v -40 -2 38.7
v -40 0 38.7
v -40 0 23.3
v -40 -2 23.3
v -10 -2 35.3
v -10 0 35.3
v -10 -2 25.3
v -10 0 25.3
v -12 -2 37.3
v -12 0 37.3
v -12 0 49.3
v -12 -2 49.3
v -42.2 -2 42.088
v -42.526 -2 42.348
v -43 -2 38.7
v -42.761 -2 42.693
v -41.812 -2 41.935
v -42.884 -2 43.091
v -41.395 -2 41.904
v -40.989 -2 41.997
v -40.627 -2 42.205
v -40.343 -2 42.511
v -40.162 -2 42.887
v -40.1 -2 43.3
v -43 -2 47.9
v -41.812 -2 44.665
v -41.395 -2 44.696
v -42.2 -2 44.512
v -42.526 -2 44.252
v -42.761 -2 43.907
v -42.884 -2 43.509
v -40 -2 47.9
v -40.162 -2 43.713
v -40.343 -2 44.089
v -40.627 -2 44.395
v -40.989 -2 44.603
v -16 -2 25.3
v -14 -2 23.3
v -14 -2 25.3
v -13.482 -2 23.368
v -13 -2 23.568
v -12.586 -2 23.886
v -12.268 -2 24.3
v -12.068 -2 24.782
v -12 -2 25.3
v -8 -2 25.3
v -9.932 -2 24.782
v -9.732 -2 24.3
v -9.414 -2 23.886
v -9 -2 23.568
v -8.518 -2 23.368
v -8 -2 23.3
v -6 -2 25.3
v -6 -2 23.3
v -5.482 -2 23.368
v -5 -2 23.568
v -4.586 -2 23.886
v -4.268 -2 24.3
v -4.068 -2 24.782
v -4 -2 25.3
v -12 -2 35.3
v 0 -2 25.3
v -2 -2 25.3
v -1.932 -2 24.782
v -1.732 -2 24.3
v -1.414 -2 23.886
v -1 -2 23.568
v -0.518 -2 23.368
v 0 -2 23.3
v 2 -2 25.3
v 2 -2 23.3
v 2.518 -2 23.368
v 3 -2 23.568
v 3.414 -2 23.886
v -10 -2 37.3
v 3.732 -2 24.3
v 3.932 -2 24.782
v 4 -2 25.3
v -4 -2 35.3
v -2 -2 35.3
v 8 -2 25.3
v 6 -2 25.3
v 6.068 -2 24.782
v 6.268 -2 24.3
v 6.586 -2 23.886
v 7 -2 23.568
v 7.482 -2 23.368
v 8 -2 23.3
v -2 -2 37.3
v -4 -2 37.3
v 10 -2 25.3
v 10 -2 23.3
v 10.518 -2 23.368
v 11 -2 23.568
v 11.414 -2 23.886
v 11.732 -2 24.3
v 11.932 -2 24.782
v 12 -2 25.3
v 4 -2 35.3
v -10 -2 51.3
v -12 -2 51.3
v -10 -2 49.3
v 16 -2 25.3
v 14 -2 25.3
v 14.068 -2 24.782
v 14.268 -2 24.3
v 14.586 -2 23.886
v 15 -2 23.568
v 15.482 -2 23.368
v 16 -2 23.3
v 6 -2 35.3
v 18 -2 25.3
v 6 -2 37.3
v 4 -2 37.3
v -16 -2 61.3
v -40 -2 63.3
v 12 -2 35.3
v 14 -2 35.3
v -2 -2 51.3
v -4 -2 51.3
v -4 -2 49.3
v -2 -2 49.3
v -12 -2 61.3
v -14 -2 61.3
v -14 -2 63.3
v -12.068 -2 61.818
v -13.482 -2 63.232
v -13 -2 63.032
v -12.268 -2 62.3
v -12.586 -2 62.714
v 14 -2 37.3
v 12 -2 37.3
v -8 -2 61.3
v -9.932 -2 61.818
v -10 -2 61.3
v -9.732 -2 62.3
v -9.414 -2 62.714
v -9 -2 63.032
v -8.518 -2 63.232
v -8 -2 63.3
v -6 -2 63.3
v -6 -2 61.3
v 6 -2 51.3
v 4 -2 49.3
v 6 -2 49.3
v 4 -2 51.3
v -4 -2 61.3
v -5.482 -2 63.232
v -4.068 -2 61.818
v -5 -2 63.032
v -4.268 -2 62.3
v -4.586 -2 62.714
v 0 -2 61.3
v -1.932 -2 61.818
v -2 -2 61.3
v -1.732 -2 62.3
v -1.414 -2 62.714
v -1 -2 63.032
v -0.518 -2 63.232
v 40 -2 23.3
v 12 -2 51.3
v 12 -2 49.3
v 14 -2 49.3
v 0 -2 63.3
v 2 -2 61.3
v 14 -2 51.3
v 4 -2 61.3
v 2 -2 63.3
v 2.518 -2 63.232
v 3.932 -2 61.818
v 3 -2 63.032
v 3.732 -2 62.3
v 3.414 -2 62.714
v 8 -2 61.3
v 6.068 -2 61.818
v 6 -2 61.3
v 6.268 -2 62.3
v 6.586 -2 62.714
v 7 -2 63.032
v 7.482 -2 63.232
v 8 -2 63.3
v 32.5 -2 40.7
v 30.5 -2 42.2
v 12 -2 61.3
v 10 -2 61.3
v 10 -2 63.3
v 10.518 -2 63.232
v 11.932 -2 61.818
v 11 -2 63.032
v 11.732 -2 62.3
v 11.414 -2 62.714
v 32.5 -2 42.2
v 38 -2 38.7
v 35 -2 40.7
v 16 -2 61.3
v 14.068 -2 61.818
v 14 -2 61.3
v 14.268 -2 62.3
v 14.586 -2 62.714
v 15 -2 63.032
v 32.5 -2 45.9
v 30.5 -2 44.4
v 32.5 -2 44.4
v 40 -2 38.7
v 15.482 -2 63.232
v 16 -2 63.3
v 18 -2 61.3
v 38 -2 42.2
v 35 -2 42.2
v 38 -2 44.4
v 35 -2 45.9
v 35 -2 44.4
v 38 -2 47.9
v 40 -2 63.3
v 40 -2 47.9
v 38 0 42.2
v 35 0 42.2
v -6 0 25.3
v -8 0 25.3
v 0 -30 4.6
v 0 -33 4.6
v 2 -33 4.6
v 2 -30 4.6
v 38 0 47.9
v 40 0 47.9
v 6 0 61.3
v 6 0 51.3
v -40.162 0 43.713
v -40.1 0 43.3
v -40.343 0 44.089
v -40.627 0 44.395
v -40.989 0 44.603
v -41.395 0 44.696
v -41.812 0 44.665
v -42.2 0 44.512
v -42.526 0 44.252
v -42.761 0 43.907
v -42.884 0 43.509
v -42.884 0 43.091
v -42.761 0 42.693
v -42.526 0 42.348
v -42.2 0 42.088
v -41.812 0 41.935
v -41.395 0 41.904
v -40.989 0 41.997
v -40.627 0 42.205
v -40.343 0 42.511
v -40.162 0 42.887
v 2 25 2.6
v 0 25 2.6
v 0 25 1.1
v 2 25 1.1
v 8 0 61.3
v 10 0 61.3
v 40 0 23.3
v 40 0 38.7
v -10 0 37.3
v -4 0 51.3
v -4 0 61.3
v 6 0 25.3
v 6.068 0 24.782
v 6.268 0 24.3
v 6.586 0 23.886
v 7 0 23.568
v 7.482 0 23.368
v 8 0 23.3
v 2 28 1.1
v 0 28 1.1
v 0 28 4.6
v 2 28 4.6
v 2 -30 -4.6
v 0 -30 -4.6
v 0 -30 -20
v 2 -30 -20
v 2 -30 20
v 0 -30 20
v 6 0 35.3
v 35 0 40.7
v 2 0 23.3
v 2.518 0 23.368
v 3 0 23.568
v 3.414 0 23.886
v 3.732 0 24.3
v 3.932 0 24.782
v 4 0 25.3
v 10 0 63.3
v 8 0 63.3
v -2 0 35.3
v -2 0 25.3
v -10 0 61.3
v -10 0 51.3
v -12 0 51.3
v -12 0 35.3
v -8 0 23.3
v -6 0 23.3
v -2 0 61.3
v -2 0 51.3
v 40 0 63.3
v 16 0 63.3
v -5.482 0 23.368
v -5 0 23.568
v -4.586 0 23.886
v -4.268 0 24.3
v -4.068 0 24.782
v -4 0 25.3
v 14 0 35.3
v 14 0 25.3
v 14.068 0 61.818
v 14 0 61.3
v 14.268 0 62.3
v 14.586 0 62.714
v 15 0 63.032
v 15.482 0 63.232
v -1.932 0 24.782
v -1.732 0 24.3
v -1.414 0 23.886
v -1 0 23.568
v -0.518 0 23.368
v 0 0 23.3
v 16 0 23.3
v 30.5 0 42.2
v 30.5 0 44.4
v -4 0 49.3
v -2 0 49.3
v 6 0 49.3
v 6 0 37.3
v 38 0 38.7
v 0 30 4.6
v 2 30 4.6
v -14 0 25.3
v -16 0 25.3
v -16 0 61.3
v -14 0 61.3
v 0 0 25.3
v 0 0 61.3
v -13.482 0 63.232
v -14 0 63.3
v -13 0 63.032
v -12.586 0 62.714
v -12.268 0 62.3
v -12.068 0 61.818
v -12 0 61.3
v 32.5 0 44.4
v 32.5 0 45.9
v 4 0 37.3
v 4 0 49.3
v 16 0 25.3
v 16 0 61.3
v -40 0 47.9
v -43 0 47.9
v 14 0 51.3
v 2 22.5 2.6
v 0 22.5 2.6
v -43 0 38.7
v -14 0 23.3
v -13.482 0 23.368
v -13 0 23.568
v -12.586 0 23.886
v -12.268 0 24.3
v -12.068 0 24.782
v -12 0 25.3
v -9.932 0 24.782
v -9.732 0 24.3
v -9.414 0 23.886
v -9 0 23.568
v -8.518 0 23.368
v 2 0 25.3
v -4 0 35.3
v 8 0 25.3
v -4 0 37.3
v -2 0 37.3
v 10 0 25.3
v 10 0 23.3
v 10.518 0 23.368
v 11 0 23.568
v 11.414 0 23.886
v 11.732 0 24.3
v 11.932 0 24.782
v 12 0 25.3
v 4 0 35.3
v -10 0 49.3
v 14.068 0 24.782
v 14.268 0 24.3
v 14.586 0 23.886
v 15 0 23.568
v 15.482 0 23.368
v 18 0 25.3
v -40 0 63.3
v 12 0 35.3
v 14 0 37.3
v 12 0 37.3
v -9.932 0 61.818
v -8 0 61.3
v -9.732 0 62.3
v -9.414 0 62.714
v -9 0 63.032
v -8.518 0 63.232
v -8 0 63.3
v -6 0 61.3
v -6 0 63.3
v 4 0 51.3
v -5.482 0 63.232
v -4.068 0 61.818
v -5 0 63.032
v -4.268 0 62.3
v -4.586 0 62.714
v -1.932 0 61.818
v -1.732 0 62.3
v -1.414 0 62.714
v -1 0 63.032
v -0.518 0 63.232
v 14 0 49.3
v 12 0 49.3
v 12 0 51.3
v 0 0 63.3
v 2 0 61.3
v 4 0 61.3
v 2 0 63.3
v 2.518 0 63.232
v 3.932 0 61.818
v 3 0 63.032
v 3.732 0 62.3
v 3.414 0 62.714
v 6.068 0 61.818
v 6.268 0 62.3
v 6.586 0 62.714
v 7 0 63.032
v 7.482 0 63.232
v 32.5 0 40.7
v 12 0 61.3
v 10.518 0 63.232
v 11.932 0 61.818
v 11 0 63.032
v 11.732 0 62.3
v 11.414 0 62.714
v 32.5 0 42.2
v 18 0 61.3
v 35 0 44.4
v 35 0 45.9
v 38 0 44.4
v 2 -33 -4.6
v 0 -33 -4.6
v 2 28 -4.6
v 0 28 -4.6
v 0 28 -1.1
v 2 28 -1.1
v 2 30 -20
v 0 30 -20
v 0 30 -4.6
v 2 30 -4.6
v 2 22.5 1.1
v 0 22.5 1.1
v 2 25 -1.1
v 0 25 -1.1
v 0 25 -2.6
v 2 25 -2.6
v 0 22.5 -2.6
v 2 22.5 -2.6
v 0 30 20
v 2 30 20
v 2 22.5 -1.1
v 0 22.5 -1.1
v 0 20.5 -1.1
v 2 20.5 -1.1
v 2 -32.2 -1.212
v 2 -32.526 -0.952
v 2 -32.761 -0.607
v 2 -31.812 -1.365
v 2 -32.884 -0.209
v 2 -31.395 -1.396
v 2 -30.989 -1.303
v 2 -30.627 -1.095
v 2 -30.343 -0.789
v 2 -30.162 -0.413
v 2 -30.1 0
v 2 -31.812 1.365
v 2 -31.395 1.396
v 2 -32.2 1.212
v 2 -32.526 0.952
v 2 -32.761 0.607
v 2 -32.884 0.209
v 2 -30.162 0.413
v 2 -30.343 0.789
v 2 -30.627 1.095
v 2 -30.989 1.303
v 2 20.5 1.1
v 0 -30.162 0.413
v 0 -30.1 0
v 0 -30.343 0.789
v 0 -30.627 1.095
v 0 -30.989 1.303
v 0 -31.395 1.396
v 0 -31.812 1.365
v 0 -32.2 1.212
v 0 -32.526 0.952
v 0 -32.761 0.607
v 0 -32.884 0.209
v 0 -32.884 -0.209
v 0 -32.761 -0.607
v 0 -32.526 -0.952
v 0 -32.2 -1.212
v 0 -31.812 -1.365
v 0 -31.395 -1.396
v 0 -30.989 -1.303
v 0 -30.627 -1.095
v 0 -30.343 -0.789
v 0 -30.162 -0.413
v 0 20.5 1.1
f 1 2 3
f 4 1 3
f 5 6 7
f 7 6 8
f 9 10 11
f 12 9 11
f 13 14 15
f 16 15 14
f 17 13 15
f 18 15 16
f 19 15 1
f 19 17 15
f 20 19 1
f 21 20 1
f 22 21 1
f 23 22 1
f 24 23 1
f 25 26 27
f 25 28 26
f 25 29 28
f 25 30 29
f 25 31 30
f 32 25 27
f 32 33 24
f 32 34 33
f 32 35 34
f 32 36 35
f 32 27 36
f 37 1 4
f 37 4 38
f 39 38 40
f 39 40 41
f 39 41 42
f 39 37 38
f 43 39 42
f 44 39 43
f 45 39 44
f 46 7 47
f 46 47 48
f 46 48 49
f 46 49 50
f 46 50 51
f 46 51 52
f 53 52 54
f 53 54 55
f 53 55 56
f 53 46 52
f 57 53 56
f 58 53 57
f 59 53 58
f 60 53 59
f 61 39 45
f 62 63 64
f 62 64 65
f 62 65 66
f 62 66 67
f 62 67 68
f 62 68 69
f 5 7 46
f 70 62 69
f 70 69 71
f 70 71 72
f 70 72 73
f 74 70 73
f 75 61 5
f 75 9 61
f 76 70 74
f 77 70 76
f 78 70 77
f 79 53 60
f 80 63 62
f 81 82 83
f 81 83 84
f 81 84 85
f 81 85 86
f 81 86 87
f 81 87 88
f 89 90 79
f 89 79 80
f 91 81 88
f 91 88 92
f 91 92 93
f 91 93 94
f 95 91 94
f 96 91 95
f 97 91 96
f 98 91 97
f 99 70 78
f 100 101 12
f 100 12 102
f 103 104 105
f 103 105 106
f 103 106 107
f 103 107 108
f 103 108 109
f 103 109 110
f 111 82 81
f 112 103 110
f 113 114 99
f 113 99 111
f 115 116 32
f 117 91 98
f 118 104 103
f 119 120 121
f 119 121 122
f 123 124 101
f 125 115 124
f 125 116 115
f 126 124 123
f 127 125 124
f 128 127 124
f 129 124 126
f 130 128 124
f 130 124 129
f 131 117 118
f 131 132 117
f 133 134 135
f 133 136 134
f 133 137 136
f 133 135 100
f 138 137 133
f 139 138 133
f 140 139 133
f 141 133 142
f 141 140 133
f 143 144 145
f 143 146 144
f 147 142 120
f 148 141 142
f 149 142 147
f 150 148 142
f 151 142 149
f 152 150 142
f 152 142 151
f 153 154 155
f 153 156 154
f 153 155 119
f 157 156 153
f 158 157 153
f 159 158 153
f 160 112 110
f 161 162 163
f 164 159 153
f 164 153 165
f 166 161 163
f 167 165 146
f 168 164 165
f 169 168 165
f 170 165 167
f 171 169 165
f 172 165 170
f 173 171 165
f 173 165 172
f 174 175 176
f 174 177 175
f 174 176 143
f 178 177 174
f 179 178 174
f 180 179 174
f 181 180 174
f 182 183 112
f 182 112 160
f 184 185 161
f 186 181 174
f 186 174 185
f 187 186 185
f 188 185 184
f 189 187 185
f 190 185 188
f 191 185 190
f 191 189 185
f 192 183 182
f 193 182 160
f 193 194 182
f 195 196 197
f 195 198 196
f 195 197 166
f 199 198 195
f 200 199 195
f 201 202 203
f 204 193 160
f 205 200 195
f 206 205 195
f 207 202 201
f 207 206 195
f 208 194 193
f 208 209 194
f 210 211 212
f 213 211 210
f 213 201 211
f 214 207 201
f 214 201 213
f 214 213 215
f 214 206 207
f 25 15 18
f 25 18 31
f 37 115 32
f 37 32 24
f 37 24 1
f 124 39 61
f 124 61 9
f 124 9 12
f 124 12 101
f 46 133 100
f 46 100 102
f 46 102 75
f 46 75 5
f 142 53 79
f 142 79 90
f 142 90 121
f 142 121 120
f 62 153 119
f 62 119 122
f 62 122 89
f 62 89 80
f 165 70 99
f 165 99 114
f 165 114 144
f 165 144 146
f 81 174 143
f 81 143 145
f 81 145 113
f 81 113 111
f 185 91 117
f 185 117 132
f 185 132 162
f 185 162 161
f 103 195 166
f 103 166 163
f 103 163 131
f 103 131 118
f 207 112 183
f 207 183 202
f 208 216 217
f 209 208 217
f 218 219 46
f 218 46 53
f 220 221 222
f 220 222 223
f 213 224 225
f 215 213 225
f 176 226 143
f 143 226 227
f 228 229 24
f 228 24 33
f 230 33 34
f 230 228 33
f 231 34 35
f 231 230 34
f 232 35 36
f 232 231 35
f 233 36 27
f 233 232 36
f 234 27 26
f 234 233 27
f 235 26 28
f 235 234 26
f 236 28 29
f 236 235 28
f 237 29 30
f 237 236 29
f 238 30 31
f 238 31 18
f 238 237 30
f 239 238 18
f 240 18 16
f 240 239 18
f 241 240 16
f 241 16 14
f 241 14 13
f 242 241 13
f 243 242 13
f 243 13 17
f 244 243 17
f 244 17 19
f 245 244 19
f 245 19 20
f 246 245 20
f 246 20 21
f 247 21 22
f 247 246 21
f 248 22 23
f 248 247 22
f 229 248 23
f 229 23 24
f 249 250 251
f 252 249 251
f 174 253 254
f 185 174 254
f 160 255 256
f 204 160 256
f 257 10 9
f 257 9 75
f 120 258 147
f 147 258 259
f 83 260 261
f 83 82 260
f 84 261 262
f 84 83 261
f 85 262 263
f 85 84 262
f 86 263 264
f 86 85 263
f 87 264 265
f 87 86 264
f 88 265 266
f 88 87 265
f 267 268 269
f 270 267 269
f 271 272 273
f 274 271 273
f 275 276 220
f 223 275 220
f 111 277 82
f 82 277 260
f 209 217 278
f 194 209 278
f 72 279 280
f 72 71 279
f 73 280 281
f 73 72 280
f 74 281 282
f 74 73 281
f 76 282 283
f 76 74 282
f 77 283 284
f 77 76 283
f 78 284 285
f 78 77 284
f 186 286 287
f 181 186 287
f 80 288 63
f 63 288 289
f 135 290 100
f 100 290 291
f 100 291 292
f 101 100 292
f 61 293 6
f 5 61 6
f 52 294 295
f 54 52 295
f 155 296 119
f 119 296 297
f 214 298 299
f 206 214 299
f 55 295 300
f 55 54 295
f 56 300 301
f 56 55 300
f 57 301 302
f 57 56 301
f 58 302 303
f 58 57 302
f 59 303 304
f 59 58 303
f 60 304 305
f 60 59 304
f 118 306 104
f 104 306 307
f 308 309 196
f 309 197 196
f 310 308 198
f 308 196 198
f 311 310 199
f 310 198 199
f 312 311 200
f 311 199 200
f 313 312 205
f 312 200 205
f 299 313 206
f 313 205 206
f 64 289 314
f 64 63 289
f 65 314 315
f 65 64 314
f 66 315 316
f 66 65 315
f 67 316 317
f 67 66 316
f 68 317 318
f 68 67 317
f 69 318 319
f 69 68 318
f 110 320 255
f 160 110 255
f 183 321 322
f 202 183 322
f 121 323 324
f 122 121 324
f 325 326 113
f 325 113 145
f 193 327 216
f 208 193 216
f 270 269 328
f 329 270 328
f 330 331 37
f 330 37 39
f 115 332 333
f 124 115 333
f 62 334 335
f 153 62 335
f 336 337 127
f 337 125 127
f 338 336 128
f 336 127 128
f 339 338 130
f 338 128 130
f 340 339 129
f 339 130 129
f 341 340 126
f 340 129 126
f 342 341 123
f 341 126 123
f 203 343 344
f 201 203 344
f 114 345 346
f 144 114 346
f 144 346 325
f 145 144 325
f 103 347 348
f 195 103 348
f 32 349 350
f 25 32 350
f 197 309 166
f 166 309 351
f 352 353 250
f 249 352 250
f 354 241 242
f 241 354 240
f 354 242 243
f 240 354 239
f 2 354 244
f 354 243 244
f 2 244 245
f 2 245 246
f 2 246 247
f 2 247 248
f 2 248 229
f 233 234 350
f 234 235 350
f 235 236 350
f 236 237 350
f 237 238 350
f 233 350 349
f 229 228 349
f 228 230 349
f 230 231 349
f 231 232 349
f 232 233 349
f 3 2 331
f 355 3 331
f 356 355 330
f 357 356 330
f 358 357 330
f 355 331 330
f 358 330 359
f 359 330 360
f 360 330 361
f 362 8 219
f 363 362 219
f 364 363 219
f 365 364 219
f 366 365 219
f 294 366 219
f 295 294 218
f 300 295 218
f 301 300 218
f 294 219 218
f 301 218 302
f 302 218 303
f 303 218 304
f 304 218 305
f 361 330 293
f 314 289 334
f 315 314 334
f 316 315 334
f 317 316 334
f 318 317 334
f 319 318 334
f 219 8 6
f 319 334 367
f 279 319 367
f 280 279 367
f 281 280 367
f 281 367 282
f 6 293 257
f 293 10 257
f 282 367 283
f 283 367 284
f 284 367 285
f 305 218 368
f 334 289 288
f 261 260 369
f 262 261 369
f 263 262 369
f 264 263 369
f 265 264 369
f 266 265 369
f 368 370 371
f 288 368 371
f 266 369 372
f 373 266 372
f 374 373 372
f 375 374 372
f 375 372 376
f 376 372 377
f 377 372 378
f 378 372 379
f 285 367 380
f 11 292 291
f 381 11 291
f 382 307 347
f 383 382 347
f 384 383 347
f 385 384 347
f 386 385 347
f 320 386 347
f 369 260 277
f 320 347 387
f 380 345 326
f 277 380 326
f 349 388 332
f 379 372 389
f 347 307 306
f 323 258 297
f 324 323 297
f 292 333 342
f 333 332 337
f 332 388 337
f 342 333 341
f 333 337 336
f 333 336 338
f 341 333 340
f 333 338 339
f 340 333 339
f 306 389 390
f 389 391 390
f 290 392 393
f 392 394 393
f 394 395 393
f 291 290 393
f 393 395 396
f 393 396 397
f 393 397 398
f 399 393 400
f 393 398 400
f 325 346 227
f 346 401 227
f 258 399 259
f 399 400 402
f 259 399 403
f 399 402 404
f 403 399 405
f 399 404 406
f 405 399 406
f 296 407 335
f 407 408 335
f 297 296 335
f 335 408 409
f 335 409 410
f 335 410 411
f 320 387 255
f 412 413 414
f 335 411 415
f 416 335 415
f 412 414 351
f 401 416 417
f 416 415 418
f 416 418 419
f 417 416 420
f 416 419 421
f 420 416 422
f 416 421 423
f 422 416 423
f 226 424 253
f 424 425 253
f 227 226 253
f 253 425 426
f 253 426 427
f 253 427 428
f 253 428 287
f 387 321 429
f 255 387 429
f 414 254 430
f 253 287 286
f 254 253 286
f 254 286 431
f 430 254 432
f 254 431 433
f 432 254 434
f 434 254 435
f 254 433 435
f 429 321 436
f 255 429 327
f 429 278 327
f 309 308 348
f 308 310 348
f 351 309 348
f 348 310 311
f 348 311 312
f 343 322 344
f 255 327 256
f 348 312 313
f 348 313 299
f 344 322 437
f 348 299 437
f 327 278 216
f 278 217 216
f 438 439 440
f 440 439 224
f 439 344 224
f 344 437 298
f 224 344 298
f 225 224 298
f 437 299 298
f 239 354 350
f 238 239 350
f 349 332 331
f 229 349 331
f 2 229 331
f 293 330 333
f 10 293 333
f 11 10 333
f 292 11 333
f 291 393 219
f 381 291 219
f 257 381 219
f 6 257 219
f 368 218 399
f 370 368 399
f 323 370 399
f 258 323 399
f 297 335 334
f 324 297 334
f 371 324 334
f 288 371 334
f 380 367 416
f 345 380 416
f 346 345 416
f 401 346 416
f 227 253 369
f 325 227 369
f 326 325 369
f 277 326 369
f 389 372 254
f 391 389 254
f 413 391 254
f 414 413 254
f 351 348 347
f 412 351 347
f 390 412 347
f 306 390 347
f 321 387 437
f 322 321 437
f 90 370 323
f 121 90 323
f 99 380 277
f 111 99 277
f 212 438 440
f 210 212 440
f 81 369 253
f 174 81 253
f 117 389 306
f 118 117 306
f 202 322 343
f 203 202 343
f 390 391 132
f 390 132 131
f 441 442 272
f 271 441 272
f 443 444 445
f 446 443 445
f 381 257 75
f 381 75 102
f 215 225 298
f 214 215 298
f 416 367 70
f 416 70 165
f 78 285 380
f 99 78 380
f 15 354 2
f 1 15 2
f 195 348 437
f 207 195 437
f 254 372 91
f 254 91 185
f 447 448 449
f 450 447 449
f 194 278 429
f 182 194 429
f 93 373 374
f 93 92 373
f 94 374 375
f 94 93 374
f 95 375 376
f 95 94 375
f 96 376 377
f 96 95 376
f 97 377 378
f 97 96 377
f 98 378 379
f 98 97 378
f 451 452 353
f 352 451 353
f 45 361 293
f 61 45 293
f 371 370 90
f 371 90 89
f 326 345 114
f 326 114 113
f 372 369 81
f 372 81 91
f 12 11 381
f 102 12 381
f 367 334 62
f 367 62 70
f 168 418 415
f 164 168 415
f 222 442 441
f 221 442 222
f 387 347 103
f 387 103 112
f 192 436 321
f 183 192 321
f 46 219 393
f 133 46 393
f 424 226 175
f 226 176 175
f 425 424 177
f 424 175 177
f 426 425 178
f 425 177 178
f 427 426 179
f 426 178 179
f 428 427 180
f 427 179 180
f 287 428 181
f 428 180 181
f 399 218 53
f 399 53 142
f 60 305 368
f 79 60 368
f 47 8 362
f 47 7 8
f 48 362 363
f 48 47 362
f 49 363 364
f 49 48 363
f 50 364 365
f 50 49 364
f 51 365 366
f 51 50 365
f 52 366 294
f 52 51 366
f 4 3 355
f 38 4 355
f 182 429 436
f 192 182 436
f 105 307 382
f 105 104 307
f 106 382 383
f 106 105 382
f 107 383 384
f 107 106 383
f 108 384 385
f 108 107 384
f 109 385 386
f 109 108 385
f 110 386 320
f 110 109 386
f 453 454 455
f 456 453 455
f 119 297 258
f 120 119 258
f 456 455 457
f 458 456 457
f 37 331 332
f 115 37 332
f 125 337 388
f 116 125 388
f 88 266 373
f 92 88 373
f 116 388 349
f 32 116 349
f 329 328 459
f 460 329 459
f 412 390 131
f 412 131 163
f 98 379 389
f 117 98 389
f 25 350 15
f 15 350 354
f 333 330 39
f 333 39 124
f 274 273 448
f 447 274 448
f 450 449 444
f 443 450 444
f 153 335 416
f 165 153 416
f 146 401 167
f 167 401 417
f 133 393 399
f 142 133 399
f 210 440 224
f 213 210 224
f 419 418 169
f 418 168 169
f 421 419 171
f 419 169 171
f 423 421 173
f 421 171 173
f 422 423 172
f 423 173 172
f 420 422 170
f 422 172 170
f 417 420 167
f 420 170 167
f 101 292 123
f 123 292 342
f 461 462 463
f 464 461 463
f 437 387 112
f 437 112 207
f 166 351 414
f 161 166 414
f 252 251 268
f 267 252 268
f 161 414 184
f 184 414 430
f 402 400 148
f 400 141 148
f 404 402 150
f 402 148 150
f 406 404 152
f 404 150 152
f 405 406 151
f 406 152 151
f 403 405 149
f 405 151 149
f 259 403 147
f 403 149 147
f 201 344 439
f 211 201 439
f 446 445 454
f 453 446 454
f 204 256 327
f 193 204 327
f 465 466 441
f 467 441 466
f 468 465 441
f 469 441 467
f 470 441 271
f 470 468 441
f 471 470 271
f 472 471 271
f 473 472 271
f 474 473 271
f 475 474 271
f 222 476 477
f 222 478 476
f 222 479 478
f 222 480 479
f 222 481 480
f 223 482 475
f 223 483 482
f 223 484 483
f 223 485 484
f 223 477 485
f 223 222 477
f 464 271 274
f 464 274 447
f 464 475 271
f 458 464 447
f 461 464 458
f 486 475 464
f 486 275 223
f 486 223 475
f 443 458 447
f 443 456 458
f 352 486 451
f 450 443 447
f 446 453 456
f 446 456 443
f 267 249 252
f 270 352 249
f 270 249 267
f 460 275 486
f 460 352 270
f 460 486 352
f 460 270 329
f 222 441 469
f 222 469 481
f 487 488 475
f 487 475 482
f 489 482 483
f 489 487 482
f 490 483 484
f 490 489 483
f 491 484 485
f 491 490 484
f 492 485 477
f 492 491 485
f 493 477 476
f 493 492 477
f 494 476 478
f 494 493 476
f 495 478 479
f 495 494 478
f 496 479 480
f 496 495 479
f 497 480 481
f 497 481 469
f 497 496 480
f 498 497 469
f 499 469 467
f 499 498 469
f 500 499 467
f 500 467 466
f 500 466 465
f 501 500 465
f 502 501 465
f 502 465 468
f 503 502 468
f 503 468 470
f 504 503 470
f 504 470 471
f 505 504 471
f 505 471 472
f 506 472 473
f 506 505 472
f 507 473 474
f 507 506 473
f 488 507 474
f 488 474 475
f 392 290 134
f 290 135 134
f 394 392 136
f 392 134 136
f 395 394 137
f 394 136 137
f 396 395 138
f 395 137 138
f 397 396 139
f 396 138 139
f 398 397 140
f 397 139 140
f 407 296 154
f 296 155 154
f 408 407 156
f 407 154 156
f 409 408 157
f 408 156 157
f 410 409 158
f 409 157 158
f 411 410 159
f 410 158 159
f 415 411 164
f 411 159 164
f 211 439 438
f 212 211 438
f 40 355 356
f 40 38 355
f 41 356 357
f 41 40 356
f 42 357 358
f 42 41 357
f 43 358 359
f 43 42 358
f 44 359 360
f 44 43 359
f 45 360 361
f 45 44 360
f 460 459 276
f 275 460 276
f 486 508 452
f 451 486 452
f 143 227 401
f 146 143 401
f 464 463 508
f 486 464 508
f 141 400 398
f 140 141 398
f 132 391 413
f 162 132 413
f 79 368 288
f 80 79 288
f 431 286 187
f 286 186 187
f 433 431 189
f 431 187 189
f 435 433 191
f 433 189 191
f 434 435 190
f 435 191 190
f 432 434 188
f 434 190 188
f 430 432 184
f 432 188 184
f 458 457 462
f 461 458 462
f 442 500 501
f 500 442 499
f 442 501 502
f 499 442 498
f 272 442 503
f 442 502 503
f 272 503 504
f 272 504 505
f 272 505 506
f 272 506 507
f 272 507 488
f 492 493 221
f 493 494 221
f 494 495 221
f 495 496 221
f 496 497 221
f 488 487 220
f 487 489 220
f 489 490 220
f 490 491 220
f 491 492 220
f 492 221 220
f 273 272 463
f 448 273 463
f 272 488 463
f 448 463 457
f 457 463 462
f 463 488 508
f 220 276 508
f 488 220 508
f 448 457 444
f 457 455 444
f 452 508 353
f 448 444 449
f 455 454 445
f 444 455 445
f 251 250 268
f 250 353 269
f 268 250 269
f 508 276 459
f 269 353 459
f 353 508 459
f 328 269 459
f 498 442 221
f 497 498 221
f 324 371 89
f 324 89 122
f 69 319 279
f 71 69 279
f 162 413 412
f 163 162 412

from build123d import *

# Parameters (mm, degrees)
F0_W     = 2
F0_H     = 36
F0_H_2   = 12
F1_DEPTH = 2
F2_W     = 3
F2_H     = 9.2
F2_R     = 1.4
F3_DEPTH = 2
F0_R     = 1.4
F4_DEPTH = 2
F5_R     = 2


with BuildPart() as f1:
    # F0 (on Front) → F1 (new body)
    with BuildSketch(Plane.XZ):
        Polygon((-11.999999, 63.3), (-39.999999, 63.3), (-39.999999, 47.9), (-39.999999, 44.8), (-39.999999, 41.8), (-39.999999, 38.7), (-39.999999, 23.3), (-11.999999, 23.3), (-11.999999, 35.3), (-9.999999, 35.3), (-9.999999, 23.3), (-3.999999, 23.3), (-3.999999, 35.3), (-1.999999, 35.3), (-1.999999, 23.3), (4.000001, 23.3), (4.000001, 35.3), (6.000001, 35.3), (6.000001, 23.3), (12.000001, 23.3), (12.000001, 35.3), (14.000001, 35.3), (14.000001, 23.3), (40.000001, 23.3), (40.000001, 38.7), (38.000001, 38.7), (38.000001, 42.2), (35.000001, 42.2), (35.000001, 40.7), (32.500001, 40.7), (32.500001, 42.2), (30.500001, 42.2), (30.500001, 43.3), (30.500001, 44.4), (32.500001, 44.4), (32.500001, 45.9), (35.000001, 45.9), (35.000001, 44.4), (38.000001, 44.4), (38.000001, 47.9), (40.000001, 47.9), (40.000001, 63.3), (14.000001, 63.3), (14.000001, 51.3), (12.000001, 51.3), (12.000001, 63.3), (6.000001, 63.3), (6.000001, 51.3), (4.000001, 51.3), (4.000001, 63.3), (-1.999999, 63.3), (-1.999999, 51.3), (-3.999999, 51.3), (-3.999999, 63.3), (-9.999999, 63.3), (-9.999999, 51.3), (-11.999999, 51.3), align=None)
        with Locations((-14.999999, 43.3)):
            Rectangle(F0_W, F0_H, mode=Mode.SUBTRACT)
        with Locations((-10.999999, 43.3)):
            Rectangle(F0_W, F0_H_2, mode=Mode.SUBTRACT)
        with Locations((-6.999999, 43.3)):
            Rectangle(F0_W, F0_H, mode=Mode.SUBTRACT)
        with Locations((-2.999999, 43.3)):
            Rectangle(F0_W, F0_H_2, mode=Mode.SUBTRACT)
        with Locations((1.000001, 43.3)):
            Rectangle(F0_W, F0_H, mode=Mode.SUBTRACT)
        with Locations((5.000001, 43.3)):
            Rectangle(F0_W, F0_H_2, mode=Mode.SUBTRACT)
        with Locations((9.000001, 43.3)):
            Rectangle(F0_W, F0_H, mode=Mode.SUBTRACT)
        with Locations((13.000001, 43.3)):
            Rectangle(F0_W, F0_H_2, mode=Mode.SUBTRACT)
        with Locations((17.000001, 43.3)):
            Rectangle(F0_W, F0_H, mode=Mode.SUBTRACT)
    extrude(amount=F1_DEPTH)

    # F0 (on Front) → F4 (join)
    with BuildSketch(Plane.XZ):
        Polygon((-39.999999, 44.8), (-39.999999, 47.9), (-42.999999, 47.9), (-42.999999, 38.7), (-39.999999, 38.7), (-39.999999, 41.8), align=None)
        with Locations((-41.499999, 43.3)):
            Circle(F0_R, mode=Mode.SUBTRACT)
    extrude(amount=F4_DEPTH)

    # F5
    f5_edges = [f1.edges().sort_by_distance(p)[0] for p in [
        (-9.999999, -1, 23.3),
        (-3.999999, -1, 23.3),
        (-1.999999, -1, 23.3),
        (4.000001, -1, 23.3),
        (6.000001, -1, 23.3),
        (12.000001, -1, 23.3),
        (14.000001, -1, 23.3),
        (-11.999999, -1, 23.3),
        (-11.999999, -1, 63.3),
        (-9.999999, -1, 63.3),
        (-3.999999, -1, 63.3),
        (-1.999999, -1, 63.3),
        (4.000001, -1, 63.3),
        (6.000001, -1, 63.3),
        (12.000001, -1, 63.3),
        (14.000001, -1, 63.3),
    ]]
    fillet(f5_edges, radius=F5_R)


with BuildPart() as f3:
    # F2 (on Right) → F3 (new body)
    with BuildSketch(Plane.YZ):
        Polygon((-30, -20), (30, -20), (30, -4.6), (28, -4.6), (28, -1.1), (25, -1.1), (25, -2.6), (22.5, -2.6), (22.5, -1.1), (20.5, -1.1), (20.5, 1.1), (22.5, 1.1), (22.5, 2.6), (25, 2.6), (25, 1.1), (28, 1.1), (28, 4.6), (30, 4.6), (30, 20), (-30, 20), (-30, 4.6), (-30, -4.6), align=None)
        with Locations((-31.5, 0)):
            Rectangle(F2_W, F2_H)
        with Locations((-31.5, 0)):
            Circle(F2_R, mode=Mode.SUBTRACT)
    extrude(amount=F3_DEPTH)


solid = Compound([f1.part, f3.part])
